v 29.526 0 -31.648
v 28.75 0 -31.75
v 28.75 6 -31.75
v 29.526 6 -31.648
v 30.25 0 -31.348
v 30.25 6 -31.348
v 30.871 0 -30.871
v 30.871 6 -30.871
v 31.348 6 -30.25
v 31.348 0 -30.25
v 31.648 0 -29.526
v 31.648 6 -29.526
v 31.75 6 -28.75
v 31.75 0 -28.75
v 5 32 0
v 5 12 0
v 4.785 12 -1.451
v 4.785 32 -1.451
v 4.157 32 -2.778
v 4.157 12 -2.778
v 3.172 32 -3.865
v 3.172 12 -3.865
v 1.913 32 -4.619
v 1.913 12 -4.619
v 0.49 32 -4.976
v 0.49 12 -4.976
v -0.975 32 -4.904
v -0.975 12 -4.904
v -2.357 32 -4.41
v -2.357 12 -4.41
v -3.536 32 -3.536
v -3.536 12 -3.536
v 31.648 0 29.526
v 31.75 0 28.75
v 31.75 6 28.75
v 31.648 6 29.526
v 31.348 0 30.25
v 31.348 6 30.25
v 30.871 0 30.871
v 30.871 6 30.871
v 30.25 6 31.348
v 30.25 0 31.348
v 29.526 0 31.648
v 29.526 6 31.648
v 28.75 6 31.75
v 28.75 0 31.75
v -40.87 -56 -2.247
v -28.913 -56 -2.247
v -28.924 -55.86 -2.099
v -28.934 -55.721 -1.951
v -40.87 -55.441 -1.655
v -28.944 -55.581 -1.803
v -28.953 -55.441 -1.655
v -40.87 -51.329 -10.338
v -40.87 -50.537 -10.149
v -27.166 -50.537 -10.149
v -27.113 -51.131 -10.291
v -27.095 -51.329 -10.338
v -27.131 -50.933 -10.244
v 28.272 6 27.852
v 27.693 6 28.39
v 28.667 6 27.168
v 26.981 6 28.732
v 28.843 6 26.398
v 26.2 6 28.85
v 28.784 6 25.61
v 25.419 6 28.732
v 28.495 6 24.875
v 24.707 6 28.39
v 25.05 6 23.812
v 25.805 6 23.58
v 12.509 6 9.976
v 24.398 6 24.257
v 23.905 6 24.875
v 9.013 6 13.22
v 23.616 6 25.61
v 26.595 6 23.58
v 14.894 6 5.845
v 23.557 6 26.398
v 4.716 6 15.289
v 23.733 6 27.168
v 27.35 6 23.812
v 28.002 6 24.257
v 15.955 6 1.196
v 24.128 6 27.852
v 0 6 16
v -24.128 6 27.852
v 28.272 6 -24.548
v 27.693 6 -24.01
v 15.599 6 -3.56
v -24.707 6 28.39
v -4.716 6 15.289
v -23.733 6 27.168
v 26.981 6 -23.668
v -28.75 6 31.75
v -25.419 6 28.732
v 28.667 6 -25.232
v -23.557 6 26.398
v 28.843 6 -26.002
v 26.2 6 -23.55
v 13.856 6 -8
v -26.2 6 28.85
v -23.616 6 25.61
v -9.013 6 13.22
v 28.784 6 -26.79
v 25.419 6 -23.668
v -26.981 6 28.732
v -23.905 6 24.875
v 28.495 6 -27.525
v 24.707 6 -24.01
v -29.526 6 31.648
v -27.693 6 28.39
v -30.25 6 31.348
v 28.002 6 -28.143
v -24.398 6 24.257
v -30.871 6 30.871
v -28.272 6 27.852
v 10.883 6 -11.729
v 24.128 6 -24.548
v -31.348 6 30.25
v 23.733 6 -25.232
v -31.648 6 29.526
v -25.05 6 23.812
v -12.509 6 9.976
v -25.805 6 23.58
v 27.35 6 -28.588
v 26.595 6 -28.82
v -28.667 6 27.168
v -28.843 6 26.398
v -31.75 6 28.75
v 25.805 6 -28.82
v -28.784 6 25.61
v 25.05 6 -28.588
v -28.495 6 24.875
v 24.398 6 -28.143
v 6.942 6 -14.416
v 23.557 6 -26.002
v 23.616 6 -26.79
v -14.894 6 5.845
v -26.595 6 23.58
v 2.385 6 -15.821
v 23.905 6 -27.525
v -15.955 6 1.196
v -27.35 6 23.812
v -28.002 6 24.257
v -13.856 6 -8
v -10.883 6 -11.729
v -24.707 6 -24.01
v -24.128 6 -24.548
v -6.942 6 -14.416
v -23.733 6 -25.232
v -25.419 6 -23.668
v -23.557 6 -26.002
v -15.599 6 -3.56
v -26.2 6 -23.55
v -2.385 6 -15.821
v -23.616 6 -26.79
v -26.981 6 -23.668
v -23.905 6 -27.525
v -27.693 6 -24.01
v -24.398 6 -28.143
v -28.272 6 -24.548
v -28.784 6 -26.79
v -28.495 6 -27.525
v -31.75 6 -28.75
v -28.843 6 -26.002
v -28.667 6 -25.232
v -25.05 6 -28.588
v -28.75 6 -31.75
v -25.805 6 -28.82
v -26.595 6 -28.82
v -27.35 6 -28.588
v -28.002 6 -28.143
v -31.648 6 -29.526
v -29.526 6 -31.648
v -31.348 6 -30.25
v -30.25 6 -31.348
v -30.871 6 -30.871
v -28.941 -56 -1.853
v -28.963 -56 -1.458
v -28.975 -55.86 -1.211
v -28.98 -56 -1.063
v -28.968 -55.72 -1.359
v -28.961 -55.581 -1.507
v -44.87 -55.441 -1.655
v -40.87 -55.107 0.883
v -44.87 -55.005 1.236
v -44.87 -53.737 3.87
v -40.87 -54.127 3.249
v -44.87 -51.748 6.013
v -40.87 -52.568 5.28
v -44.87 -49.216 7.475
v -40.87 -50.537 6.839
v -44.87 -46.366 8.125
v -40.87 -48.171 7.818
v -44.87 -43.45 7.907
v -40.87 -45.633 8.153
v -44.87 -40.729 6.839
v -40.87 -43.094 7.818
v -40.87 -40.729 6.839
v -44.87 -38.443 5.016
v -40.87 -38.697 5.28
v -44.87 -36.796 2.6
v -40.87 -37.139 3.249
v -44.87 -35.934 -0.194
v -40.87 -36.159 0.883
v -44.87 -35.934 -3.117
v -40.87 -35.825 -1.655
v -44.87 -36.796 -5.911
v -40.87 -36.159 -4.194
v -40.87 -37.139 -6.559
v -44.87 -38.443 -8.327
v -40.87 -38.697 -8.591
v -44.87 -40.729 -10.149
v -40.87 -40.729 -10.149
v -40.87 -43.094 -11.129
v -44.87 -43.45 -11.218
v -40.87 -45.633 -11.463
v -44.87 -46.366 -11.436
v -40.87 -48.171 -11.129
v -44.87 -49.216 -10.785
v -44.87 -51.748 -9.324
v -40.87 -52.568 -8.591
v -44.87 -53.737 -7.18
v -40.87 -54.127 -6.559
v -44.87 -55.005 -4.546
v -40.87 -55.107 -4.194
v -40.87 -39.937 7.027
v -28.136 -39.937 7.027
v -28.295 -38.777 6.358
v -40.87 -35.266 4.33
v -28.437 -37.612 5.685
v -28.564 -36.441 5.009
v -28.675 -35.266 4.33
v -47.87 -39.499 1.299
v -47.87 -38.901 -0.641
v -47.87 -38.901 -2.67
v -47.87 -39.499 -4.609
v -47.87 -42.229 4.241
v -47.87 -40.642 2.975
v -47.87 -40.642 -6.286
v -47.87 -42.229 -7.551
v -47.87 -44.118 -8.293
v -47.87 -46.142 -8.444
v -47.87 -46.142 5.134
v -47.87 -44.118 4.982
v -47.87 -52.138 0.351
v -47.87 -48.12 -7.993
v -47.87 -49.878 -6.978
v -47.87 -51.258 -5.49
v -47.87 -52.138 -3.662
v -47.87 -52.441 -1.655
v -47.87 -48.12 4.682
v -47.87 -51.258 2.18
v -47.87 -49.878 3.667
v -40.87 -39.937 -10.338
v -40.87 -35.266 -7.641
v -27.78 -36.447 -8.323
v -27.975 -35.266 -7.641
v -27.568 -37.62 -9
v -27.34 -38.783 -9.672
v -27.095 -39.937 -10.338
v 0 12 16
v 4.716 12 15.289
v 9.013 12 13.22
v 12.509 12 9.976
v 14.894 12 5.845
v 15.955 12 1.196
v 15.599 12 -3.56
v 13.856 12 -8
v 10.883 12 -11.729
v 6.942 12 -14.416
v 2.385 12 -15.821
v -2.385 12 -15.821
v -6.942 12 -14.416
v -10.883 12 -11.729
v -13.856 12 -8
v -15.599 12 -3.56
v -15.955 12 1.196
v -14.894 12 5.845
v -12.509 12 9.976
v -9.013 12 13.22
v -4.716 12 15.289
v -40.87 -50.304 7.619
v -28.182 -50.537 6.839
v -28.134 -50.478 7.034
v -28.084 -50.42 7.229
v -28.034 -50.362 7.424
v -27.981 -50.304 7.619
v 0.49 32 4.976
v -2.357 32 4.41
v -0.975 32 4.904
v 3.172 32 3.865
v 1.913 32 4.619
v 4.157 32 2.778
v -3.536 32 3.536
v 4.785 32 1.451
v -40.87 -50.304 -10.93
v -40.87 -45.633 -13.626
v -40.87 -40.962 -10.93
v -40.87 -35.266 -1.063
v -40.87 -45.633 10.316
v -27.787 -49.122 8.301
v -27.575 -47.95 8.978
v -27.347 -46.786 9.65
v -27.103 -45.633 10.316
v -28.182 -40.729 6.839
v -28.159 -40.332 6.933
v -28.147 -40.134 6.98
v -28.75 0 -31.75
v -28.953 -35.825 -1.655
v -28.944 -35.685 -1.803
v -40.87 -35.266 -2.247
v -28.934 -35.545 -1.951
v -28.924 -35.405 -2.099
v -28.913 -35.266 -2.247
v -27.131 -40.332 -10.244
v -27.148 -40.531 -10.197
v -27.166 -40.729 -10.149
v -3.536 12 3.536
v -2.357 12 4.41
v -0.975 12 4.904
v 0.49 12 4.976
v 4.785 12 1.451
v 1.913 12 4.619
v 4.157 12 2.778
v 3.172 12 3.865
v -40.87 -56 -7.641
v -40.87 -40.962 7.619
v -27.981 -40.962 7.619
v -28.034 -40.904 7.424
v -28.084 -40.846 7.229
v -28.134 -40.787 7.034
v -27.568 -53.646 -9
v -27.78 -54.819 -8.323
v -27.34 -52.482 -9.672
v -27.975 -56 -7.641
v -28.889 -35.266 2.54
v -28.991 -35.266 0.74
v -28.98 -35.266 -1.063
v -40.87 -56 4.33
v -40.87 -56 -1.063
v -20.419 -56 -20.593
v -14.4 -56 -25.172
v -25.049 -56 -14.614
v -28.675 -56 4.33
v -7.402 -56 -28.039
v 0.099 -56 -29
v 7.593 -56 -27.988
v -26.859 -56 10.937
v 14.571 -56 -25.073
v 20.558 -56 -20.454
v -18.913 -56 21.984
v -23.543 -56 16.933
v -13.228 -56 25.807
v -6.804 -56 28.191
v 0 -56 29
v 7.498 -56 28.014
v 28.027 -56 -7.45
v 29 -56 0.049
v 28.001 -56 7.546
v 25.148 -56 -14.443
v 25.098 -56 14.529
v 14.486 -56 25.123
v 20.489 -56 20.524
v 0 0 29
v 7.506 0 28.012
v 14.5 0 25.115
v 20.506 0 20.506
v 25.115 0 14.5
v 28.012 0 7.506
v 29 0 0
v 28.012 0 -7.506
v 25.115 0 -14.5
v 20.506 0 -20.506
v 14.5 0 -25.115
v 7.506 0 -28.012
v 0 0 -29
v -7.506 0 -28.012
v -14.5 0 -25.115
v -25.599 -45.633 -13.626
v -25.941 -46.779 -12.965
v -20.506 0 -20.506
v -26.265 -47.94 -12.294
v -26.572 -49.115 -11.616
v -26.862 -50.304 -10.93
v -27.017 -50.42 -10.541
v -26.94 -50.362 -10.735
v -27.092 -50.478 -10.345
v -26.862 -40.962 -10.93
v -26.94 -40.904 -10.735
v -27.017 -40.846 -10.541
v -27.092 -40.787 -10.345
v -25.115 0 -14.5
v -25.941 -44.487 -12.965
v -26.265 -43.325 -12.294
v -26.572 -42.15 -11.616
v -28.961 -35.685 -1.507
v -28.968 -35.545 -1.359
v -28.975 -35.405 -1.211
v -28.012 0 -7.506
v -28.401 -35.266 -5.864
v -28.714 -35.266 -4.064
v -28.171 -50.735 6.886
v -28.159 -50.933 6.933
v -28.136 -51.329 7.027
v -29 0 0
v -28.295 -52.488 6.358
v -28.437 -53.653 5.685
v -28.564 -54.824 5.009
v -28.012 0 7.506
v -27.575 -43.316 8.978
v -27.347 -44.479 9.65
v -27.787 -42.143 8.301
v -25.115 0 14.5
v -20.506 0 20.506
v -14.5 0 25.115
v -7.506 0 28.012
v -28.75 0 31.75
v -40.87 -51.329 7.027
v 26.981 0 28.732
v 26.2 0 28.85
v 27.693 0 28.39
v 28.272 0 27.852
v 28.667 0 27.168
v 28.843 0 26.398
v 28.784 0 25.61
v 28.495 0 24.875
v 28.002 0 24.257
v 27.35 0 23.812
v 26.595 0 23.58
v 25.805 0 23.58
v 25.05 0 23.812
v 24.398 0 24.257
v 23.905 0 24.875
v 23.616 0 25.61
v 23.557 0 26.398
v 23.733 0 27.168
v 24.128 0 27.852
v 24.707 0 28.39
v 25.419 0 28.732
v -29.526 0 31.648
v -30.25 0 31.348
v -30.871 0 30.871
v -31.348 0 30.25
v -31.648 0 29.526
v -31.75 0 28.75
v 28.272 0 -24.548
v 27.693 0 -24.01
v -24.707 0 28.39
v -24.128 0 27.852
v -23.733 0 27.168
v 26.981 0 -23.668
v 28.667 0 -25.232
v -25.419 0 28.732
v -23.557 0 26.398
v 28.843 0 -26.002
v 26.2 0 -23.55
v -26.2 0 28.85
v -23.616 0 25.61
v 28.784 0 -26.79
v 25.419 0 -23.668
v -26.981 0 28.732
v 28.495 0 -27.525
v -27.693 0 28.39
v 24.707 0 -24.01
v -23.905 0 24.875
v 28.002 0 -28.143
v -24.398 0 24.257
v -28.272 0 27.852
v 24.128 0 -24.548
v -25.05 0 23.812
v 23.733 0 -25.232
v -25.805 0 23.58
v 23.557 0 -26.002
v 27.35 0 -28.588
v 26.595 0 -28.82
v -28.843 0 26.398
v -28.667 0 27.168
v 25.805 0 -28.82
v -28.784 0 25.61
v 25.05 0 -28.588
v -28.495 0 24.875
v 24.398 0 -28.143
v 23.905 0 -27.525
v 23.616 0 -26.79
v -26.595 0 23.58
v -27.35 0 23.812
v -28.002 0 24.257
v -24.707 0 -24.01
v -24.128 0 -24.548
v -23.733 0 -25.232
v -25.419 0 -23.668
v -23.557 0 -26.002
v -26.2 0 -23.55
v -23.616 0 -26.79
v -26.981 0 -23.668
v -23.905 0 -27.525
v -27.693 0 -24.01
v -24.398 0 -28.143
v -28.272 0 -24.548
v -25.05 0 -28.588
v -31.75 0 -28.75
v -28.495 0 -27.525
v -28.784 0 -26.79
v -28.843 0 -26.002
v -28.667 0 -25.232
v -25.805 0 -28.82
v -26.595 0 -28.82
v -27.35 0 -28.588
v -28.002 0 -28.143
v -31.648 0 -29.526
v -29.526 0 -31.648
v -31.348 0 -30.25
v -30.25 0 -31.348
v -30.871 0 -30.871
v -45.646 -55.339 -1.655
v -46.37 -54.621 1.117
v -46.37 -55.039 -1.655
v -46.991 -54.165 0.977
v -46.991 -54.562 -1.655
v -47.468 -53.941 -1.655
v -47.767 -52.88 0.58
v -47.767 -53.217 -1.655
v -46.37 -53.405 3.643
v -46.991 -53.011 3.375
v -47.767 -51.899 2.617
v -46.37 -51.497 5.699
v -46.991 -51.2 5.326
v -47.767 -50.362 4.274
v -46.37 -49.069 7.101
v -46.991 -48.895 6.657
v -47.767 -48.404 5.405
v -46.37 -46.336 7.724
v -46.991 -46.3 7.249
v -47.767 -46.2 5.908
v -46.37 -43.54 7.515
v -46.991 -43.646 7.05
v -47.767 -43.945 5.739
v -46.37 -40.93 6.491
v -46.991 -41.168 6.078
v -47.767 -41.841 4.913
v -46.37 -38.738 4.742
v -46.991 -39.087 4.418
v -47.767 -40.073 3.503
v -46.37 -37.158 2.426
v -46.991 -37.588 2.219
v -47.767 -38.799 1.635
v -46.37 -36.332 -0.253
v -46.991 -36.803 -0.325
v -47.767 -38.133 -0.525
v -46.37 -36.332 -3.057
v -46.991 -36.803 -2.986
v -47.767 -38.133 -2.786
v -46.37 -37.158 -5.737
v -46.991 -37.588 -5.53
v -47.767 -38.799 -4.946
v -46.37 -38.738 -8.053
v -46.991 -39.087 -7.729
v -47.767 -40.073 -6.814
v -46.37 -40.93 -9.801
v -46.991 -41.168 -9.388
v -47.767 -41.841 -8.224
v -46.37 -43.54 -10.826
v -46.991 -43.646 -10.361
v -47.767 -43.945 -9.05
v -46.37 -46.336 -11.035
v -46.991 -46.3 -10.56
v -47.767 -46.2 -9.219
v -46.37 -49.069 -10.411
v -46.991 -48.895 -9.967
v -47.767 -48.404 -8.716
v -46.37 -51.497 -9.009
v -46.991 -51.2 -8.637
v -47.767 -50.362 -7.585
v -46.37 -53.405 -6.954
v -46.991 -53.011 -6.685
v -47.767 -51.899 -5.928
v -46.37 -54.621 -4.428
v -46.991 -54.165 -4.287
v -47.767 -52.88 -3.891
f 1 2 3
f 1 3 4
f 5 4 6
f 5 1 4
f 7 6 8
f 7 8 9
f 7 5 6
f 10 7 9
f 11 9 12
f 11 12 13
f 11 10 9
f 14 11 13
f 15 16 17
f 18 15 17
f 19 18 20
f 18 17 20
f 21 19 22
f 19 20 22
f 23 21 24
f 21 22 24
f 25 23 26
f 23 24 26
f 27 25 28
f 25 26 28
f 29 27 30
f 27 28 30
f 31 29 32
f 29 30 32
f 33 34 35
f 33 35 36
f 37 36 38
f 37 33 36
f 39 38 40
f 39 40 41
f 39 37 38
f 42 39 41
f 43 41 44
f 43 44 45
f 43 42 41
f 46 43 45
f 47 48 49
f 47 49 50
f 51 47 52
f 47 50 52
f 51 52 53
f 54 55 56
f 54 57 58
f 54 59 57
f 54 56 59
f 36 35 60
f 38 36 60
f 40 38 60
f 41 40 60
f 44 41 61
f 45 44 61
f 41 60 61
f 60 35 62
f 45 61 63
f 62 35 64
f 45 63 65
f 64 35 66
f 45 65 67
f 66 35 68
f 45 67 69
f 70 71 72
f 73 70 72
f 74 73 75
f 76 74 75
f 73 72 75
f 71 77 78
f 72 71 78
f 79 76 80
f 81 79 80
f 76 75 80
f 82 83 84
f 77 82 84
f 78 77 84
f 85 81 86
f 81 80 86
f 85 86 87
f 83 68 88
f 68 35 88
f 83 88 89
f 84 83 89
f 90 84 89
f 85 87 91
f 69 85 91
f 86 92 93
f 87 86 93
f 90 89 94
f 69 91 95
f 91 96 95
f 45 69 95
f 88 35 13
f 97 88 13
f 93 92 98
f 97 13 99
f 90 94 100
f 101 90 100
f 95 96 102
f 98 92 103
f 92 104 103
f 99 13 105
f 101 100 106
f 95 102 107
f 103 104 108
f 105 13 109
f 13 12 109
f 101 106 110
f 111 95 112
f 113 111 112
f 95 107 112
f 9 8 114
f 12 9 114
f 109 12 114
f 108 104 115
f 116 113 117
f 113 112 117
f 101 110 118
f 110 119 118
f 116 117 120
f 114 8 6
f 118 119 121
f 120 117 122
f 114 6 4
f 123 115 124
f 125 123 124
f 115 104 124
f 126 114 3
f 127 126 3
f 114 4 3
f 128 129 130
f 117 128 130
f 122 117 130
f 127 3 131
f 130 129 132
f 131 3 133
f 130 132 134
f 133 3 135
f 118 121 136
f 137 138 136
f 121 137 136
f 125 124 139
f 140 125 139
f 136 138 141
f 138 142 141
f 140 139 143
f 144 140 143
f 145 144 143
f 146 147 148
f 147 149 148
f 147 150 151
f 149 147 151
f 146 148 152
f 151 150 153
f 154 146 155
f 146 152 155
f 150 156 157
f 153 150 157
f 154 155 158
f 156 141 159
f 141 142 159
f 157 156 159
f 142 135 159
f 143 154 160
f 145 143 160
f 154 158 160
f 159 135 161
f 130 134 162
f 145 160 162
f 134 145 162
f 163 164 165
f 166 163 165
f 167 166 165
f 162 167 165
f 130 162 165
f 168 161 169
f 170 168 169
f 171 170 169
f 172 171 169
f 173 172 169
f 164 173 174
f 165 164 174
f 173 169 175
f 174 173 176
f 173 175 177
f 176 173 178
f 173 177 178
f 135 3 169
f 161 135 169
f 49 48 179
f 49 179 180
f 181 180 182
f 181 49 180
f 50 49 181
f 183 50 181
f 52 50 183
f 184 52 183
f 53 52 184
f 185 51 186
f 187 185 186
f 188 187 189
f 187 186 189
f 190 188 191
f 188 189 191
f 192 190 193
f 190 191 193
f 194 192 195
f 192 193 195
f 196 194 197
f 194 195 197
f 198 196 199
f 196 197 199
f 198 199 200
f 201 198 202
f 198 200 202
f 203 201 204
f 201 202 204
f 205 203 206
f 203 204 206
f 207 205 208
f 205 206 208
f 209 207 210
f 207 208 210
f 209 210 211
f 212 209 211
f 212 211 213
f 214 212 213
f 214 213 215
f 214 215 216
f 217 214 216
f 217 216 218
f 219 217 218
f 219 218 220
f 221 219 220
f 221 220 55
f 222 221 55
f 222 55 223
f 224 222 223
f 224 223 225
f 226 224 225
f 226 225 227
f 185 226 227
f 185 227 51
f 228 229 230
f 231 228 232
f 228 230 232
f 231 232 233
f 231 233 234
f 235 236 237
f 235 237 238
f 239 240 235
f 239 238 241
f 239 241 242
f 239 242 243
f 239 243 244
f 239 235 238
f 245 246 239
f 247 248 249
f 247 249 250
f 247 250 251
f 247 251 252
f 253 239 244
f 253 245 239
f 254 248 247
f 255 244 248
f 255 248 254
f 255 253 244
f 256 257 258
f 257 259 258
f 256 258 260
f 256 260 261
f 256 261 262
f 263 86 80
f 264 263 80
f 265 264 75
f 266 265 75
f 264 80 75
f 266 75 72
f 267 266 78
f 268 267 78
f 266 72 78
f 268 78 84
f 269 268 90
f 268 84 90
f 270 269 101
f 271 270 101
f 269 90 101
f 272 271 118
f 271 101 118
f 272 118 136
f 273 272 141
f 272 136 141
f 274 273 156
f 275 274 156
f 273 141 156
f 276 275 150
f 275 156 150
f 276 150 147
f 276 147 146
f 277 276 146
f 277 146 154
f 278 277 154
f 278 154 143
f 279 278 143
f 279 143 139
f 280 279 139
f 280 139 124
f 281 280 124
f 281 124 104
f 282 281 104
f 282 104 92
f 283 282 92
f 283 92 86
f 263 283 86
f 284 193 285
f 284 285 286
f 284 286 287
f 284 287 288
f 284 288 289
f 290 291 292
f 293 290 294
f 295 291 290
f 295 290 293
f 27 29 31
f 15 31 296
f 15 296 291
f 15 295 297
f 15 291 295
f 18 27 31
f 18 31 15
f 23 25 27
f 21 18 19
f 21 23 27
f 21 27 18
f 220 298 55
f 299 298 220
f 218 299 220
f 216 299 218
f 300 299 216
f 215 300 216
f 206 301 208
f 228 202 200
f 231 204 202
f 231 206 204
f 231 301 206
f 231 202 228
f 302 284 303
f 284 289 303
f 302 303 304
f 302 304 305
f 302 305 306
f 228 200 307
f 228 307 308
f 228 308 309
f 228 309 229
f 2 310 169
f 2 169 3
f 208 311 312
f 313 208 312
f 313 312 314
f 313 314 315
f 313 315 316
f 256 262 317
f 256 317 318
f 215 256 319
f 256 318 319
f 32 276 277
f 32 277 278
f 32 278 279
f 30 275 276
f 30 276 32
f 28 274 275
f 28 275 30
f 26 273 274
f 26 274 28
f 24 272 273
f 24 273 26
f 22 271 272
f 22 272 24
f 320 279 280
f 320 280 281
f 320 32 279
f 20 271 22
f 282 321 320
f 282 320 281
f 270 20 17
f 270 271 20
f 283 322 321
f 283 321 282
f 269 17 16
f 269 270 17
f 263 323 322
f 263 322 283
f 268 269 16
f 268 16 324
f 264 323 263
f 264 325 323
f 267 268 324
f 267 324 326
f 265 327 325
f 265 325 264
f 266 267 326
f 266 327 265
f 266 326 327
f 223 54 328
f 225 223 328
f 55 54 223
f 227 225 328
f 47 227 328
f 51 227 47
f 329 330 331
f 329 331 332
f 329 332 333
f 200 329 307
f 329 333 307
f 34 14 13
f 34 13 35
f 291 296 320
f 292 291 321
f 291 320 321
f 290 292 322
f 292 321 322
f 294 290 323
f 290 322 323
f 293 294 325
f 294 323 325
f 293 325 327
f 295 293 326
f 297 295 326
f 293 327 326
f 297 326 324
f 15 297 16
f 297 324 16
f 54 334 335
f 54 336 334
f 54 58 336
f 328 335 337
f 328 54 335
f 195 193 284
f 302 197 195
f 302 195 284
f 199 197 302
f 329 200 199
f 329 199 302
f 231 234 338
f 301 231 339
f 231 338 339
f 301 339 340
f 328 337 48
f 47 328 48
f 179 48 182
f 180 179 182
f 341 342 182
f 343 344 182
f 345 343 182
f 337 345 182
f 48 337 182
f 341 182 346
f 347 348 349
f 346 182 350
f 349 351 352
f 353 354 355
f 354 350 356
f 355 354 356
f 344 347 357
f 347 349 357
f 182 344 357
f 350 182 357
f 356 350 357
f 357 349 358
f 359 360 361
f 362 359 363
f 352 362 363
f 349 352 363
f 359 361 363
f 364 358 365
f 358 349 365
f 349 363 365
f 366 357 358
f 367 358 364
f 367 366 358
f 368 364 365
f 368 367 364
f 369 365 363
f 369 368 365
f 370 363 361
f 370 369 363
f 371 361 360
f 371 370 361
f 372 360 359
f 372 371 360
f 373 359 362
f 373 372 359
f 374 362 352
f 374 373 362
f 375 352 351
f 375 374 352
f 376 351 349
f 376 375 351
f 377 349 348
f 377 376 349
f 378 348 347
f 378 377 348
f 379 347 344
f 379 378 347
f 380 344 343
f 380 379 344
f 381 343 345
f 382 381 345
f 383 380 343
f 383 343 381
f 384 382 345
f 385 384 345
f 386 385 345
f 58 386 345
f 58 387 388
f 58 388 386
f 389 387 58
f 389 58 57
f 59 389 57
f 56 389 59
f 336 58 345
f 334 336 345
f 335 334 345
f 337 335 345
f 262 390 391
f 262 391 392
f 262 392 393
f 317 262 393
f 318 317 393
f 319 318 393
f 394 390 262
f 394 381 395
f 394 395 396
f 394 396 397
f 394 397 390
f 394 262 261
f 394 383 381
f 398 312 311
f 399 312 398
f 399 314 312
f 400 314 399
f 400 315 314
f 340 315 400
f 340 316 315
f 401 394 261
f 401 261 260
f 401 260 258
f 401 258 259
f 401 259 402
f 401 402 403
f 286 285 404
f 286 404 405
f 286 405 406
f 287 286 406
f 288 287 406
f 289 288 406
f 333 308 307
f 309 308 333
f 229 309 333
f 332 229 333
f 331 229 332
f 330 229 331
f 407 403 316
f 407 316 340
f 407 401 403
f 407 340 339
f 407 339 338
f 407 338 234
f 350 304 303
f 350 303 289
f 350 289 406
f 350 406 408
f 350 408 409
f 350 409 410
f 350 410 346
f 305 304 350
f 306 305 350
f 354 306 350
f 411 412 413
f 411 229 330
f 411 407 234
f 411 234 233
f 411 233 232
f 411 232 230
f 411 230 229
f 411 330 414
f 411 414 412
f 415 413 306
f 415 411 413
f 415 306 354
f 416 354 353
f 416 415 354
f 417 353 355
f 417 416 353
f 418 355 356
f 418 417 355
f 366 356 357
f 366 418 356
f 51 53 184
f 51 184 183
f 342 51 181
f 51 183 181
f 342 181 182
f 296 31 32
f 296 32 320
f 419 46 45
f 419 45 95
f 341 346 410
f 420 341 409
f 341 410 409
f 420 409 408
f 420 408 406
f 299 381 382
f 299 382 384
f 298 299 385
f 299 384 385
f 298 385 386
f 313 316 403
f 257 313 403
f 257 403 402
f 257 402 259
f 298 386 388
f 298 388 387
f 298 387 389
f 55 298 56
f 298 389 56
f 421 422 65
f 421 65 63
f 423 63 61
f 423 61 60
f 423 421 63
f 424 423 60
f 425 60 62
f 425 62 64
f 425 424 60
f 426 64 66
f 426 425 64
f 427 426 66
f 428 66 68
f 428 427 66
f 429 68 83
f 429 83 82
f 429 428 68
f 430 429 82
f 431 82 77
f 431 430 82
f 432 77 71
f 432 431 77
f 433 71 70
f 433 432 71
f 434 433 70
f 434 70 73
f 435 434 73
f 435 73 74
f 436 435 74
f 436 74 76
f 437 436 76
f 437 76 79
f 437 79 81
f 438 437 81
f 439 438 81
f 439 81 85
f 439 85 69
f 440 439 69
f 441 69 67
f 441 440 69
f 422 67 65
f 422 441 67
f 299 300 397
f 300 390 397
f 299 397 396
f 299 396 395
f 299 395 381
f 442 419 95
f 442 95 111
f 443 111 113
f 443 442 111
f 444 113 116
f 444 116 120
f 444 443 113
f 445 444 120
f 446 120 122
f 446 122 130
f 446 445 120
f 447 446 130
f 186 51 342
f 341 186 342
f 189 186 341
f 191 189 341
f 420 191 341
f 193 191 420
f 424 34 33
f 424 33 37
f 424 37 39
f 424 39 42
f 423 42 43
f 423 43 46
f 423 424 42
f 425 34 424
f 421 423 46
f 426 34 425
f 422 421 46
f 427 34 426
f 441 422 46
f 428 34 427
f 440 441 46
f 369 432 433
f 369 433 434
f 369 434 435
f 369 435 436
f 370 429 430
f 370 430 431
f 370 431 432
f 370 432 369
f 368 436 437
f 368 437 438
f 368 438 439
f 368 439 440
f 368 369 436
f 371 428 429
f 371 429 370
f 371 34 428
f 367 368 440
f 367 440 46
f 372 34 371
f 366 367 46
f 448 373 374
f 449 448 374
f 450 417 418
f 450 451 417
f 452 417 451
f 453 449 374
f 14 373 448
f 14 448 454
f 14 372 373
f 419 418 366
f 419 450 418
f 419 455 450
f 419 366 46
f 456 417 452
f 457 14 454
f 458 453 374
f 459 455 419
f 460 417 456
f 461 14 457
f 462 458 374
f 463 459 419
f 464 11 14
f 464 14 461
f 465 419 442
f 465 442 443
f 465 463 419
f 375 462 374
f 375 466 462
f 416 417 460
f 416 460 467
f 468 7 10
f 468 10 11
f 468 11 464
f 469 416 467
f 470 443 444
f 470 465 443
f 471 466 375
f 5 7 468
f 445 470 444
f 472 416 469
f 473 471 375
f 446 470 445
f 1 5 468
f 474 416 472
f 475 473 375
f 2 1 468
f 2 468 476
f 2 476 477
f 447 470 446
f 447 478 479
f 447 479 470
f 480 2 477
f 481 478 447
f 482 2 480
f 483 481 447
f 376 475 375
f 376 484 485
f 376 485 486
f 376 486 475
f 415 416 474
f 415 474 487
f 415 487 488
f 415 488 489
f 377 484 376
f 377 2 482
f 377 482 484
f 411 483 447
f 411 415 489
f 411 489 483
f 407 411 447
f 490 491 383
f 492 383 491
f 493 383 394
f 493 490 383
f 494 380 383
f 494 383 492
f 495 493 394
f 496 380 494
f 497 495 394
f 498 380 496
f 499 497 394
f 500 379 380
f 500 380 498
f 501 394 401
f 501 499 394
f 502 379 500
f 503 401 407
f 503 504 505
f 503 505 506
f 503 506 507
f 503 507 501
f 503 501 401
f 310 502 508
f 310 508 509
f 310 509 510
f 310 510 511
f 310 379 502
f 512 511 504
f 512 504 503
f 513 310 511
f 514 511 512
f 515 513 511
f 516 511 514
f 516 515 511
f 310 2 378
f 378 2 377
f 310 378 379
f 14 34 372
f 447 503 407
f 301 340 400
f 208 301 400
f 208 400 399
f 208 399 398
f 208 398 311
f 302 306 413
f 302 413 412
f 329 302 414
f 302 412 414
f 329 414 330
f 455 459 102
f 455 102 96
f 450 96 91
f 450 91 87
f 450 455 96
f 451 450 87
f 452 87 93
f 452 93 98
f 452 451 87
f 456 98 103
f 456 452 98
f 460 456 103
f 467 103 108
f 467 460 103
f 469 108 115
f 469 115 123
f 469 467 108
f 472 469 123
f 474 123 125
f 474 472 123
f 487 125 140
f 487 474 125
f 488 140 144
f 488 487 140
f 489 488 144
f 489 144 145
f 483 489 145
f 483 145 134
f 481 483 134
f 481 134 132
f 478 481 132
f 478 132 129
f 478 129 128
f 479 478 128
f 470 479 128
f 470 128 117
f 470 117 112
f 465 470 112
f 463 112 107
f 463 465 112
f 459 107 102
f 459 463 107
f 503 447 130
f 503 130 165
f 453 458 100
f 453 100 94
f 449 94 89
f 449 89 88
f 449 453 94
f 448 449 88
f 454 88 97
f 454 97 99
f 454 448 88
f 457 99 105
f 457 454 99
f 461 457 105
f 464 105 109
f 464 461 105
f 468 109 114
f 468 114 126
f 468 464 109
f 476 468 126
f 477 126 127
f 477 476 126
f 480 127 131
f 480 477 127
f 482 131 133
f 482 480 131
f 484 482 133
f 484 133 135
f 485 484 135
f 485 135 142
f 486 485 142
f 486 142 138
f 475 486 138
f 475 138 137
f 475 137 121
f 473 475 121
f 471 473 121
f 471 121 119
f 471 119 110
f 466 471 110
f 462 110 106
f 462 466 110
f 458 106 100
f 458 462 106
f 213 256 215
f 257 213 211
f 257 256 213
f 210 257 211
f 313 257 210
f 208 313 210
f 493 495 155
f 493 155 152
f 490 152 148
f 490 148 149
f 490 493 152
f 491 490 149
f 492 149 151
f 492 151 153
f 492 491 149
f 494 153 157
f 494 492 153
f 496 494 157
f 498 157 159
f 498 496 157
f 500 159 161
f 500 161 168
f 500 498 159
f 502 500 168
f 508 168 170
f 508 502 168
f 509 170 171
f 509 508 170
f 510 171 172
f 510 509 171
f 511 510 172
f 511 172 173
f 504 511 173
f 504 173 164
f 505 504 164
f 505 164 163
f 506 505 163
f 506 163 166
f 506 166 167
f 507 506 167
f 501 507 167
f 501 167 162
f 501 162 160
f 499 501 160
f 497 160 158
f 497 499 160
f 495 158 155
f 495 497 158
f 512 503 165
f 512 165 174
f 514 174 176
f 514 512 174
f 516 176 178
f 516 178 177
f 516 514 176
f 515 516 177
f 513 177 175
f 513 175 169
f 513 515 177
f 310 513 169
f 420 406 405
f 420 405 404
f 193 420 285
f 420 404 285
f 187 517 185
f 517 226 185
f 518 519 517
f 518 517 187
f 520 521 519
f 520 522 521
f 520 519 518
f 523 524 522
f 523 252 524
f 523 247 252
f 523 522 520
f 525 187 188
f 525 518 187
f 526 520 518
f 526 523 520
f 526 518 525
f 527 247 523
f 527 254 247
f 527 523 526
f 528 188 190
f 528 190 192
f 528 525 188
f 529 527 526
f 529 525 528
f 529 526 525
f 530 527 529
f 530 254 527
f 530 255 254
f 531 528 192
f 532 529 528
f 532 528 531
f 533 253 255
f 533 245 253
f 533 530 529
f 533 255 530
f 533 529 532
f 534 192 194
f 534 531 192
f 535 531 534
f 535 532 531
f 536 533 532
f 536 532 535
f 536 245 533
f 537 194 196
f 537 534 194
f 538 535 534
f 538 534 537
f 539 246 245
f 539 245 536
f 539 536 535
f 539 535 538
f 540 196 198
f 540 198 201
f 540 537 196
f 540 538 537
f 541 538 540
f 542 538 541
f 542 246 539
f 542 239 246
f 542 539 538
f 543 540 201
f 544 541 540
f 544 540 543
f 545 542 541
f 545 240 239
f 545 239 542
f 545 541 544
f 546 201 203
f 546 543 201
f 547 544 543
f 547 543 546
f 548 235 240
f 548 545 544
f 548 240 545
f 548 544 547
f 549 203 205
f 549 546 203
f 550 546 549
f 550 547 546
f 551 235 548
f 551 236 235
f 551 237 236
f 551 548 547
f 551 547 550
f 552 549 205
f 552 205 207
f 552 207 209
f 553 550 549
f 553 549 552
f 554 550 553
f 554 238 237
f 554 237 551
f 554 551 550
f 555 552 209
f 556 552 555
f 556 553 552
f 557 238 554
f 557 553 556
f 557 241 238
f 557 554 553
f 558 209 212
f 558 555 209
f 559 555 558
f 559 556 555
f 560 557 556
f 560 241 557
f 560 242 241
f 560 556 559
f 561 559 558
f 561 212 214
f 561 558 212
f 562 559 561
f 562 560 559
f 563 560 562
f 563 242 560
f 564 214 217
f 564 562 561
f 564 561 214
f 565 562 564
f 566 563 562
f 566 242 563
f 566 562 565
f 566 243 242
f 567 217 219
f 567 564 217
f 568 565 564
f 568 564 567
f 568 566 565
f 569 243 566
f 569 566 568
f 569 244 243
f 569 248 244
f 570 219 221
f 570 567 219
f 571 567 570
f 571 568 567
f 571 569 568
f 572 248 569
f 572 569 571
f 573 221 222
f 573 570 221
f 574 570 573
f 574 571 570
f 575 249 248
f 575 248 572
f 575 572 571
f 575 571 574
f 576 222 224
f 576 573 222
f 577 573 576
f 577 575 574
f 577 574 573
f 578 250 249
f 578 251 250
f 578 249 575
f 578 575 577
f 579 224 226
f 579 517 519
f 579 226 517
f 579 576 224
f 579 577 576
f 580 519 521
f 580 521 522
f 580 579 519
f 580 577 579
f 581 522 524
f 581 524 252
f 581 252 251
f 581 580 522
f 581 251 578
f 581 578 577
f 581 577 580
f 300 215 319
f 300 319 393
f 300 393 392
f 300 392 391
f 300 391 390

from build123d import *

# Parameters (mm, degrees)
BOSS_EXTRUDE1_DEPTH      = 32
SKETCH1_3_R              = 16
BOSS_EXTRUDE2_DEPTH      = 12
SKETCH1_4_R              = 2.65
SKETCH1_4_R_2            = 16
BOSS_EXTRUDE3_DEPTH      = 6
SKETCH1_5_R              = 29
BOSS_EXTRUDE4_DEPTH      = 56
BOSS_EXTRUDE5_DEPTH      = 12
BOSS_EXTRUDE5_DEPTH_BACK = 5
SKETCH3_R                = 9.808050829
BOSS_EXTRUDE6_DEPTH      = 7
FILLET1_R                = 3


with BuildPart() as part:
    # Sketch1 → Boss-Extrude1 (new body)
    with BuildSketch(Plane(origin=(0, 0, 0), x_dir=(1, 0, 0), z_dir=(0, 1, 0))):
        with BuildLine():
            Line((-3.535533906, 3.535533906), (-3.535533906, -3.535533906))
            ThreePointArc((-3.535533906, -3.535533906), (1.913417162, -4.619397663), (5, 0))
            ThreePointArc((5, 0), (1.913417162, 4.619397663), (-3.535533906, 3.535533906))
        make_face()
    extrude(amount=BOSS_EXTRUDE1_DEPTH)

    # Sketch1<3> → Boss-Extrude2 (add)
    with BuildSketch(Plane(origin=(0, 0, 0), x_dir=(1, 0, 0), z_dir=(0, 1, 0))):
        Circle(SKETCH1_3_R)
        with BuildLine():
            Line((-3.535533906, -3.535533906), (-3.535533906, 3.535533906))
            ThreePointArc((-3.535533906, 3.535533906), (5, 0), (-3.535533906, -3.535533906))
        make_face(mode=Mode.SUBTRACT)
    extrude(amount=BOSS_EXTRUDE2_DEPTH)

    # Sketch1<4> → Boss-Extrude3 (add)
    with BuildSketch(Plane(origin=(0, 0, 0), x_dir=(1, 0, 0), z_dir=(0, 1, 0))):
        with BuildLine():
            Line((28.75, 31.75), (-28.75, 31.75))
            ThreePointArc((-28.75, 31.75), (-30.871320344, 30.871320344), (-31.75, 28.75))
            Line((-31.75, 28.75), (-31.75, -28.75))
            ThreePointArc((-31.75, -28.75), (-30.871320344, -30.871320344), (-28.75, -31.75))
            Line((-28.75, -31.75), (28.75, -31.75))
            ThreePointArc((28.75, -31.75), (30.871320344, -30.871320344), (31.75, -28.75))
            Line((31.75, -28.75), (31.75, 28.75))
            ThreePointArc((31.75, 28.75), (30.871320344, 30.871320344), (28.75, 31.75))
        make_face()
        with Locations((-26.2, -26.2)):
            Circle(SKETCH1_4_R, mode=Mode.SUBTRACT)
        with Locations((26.2, -26.2)):
            Circle(SKETCH1_4_R, mode=Mode.SUBTRACT)
        with Locations((-26.2, 26.2)):
            Circle(SKETCH1_4_R, mode=Mode.SUBTRACT)
        with Locations((26.2, 26.2)):
            Circle(SKETCH1_4_R, mode=Mode.SUBTRACT)
        Circle(SKETCH1_4_R_2, mode=Mode.SUBTRACT)
    extrude(amount=BOSS_EXTRUDE3_DEPTH)

    # Sketch1<5> → Boss-Extrude4 (add)
    with BuildSketch(Plane(origin=(0, 0, 0), x_dir=(1, 0, 0), z_dir=(0, 1, 0))):
        Circle(SKETCH1_5_R)
    extrude(amount=-BOSS_EXTRUDE4_DEPTH)

    # Sketch2 → Boss-Extrude5 (add, two sides: drawn at the far end of the back side and taken through both)
    with BuildSketch(Plane.ZY.offset(28.869533834).offset(-BOSS_EXTRUDE5_DEPTH_BACK)):
        Polygon((-1.063399037, -56), (4.330127019, -56), (7.026890047, -51.32906942), (6.838640743, -50.536822393), (7.618871446, -50.303727559), (10.315634474, -45.632796979), (7.618871446, -40.961866399), (6.838640743, -40.728771565), (7.026890047, -39.936524538), (4.330127019, -35.265593958), (-1.063399037, -35.265593958), (-1.655380436, -35.82474615), (-2.247361835, -35.265593958), (-7.640887891, -35.265593958), (-10.337650919, -39.936524538), (-10.149401615, -40.728771565), (-10.929632318, -40.961866399), (-13.626395346, -45.632796979), (-10.929632318, -50.303727559), (-10.149401615, -50.536822393), (-10.337650919, -51.32906942), (-7.640887891, -56), (-2.247361835, -56), (-1.655380436, -55.440847807), align=None)
    extrude(amount=BOSS_EXTRUDE5_DEPTH + BOSS_EXTRUDE5_DEPTH_BACK)

    # Sketch3 → Boss-Extrude6 (add)
    with BuildSketch(Plane.ZY.offset(40.869533834)):
        with Locations((-1.655380436, -45.632796979)):
            Circle(SKETCH3_R)
    extrude(amount=BOSS_EXTRUDE6_DEPTH)

    # Fillet1
    fillet1_edges = [part.edges().sort_by_distance(p)[0] for p in [
        (-47.869533834, -45.632796979, -11.463431265),
    ]]
    fillet(fillet1_edges, radius=FILLET1_R)


solid = part.part
